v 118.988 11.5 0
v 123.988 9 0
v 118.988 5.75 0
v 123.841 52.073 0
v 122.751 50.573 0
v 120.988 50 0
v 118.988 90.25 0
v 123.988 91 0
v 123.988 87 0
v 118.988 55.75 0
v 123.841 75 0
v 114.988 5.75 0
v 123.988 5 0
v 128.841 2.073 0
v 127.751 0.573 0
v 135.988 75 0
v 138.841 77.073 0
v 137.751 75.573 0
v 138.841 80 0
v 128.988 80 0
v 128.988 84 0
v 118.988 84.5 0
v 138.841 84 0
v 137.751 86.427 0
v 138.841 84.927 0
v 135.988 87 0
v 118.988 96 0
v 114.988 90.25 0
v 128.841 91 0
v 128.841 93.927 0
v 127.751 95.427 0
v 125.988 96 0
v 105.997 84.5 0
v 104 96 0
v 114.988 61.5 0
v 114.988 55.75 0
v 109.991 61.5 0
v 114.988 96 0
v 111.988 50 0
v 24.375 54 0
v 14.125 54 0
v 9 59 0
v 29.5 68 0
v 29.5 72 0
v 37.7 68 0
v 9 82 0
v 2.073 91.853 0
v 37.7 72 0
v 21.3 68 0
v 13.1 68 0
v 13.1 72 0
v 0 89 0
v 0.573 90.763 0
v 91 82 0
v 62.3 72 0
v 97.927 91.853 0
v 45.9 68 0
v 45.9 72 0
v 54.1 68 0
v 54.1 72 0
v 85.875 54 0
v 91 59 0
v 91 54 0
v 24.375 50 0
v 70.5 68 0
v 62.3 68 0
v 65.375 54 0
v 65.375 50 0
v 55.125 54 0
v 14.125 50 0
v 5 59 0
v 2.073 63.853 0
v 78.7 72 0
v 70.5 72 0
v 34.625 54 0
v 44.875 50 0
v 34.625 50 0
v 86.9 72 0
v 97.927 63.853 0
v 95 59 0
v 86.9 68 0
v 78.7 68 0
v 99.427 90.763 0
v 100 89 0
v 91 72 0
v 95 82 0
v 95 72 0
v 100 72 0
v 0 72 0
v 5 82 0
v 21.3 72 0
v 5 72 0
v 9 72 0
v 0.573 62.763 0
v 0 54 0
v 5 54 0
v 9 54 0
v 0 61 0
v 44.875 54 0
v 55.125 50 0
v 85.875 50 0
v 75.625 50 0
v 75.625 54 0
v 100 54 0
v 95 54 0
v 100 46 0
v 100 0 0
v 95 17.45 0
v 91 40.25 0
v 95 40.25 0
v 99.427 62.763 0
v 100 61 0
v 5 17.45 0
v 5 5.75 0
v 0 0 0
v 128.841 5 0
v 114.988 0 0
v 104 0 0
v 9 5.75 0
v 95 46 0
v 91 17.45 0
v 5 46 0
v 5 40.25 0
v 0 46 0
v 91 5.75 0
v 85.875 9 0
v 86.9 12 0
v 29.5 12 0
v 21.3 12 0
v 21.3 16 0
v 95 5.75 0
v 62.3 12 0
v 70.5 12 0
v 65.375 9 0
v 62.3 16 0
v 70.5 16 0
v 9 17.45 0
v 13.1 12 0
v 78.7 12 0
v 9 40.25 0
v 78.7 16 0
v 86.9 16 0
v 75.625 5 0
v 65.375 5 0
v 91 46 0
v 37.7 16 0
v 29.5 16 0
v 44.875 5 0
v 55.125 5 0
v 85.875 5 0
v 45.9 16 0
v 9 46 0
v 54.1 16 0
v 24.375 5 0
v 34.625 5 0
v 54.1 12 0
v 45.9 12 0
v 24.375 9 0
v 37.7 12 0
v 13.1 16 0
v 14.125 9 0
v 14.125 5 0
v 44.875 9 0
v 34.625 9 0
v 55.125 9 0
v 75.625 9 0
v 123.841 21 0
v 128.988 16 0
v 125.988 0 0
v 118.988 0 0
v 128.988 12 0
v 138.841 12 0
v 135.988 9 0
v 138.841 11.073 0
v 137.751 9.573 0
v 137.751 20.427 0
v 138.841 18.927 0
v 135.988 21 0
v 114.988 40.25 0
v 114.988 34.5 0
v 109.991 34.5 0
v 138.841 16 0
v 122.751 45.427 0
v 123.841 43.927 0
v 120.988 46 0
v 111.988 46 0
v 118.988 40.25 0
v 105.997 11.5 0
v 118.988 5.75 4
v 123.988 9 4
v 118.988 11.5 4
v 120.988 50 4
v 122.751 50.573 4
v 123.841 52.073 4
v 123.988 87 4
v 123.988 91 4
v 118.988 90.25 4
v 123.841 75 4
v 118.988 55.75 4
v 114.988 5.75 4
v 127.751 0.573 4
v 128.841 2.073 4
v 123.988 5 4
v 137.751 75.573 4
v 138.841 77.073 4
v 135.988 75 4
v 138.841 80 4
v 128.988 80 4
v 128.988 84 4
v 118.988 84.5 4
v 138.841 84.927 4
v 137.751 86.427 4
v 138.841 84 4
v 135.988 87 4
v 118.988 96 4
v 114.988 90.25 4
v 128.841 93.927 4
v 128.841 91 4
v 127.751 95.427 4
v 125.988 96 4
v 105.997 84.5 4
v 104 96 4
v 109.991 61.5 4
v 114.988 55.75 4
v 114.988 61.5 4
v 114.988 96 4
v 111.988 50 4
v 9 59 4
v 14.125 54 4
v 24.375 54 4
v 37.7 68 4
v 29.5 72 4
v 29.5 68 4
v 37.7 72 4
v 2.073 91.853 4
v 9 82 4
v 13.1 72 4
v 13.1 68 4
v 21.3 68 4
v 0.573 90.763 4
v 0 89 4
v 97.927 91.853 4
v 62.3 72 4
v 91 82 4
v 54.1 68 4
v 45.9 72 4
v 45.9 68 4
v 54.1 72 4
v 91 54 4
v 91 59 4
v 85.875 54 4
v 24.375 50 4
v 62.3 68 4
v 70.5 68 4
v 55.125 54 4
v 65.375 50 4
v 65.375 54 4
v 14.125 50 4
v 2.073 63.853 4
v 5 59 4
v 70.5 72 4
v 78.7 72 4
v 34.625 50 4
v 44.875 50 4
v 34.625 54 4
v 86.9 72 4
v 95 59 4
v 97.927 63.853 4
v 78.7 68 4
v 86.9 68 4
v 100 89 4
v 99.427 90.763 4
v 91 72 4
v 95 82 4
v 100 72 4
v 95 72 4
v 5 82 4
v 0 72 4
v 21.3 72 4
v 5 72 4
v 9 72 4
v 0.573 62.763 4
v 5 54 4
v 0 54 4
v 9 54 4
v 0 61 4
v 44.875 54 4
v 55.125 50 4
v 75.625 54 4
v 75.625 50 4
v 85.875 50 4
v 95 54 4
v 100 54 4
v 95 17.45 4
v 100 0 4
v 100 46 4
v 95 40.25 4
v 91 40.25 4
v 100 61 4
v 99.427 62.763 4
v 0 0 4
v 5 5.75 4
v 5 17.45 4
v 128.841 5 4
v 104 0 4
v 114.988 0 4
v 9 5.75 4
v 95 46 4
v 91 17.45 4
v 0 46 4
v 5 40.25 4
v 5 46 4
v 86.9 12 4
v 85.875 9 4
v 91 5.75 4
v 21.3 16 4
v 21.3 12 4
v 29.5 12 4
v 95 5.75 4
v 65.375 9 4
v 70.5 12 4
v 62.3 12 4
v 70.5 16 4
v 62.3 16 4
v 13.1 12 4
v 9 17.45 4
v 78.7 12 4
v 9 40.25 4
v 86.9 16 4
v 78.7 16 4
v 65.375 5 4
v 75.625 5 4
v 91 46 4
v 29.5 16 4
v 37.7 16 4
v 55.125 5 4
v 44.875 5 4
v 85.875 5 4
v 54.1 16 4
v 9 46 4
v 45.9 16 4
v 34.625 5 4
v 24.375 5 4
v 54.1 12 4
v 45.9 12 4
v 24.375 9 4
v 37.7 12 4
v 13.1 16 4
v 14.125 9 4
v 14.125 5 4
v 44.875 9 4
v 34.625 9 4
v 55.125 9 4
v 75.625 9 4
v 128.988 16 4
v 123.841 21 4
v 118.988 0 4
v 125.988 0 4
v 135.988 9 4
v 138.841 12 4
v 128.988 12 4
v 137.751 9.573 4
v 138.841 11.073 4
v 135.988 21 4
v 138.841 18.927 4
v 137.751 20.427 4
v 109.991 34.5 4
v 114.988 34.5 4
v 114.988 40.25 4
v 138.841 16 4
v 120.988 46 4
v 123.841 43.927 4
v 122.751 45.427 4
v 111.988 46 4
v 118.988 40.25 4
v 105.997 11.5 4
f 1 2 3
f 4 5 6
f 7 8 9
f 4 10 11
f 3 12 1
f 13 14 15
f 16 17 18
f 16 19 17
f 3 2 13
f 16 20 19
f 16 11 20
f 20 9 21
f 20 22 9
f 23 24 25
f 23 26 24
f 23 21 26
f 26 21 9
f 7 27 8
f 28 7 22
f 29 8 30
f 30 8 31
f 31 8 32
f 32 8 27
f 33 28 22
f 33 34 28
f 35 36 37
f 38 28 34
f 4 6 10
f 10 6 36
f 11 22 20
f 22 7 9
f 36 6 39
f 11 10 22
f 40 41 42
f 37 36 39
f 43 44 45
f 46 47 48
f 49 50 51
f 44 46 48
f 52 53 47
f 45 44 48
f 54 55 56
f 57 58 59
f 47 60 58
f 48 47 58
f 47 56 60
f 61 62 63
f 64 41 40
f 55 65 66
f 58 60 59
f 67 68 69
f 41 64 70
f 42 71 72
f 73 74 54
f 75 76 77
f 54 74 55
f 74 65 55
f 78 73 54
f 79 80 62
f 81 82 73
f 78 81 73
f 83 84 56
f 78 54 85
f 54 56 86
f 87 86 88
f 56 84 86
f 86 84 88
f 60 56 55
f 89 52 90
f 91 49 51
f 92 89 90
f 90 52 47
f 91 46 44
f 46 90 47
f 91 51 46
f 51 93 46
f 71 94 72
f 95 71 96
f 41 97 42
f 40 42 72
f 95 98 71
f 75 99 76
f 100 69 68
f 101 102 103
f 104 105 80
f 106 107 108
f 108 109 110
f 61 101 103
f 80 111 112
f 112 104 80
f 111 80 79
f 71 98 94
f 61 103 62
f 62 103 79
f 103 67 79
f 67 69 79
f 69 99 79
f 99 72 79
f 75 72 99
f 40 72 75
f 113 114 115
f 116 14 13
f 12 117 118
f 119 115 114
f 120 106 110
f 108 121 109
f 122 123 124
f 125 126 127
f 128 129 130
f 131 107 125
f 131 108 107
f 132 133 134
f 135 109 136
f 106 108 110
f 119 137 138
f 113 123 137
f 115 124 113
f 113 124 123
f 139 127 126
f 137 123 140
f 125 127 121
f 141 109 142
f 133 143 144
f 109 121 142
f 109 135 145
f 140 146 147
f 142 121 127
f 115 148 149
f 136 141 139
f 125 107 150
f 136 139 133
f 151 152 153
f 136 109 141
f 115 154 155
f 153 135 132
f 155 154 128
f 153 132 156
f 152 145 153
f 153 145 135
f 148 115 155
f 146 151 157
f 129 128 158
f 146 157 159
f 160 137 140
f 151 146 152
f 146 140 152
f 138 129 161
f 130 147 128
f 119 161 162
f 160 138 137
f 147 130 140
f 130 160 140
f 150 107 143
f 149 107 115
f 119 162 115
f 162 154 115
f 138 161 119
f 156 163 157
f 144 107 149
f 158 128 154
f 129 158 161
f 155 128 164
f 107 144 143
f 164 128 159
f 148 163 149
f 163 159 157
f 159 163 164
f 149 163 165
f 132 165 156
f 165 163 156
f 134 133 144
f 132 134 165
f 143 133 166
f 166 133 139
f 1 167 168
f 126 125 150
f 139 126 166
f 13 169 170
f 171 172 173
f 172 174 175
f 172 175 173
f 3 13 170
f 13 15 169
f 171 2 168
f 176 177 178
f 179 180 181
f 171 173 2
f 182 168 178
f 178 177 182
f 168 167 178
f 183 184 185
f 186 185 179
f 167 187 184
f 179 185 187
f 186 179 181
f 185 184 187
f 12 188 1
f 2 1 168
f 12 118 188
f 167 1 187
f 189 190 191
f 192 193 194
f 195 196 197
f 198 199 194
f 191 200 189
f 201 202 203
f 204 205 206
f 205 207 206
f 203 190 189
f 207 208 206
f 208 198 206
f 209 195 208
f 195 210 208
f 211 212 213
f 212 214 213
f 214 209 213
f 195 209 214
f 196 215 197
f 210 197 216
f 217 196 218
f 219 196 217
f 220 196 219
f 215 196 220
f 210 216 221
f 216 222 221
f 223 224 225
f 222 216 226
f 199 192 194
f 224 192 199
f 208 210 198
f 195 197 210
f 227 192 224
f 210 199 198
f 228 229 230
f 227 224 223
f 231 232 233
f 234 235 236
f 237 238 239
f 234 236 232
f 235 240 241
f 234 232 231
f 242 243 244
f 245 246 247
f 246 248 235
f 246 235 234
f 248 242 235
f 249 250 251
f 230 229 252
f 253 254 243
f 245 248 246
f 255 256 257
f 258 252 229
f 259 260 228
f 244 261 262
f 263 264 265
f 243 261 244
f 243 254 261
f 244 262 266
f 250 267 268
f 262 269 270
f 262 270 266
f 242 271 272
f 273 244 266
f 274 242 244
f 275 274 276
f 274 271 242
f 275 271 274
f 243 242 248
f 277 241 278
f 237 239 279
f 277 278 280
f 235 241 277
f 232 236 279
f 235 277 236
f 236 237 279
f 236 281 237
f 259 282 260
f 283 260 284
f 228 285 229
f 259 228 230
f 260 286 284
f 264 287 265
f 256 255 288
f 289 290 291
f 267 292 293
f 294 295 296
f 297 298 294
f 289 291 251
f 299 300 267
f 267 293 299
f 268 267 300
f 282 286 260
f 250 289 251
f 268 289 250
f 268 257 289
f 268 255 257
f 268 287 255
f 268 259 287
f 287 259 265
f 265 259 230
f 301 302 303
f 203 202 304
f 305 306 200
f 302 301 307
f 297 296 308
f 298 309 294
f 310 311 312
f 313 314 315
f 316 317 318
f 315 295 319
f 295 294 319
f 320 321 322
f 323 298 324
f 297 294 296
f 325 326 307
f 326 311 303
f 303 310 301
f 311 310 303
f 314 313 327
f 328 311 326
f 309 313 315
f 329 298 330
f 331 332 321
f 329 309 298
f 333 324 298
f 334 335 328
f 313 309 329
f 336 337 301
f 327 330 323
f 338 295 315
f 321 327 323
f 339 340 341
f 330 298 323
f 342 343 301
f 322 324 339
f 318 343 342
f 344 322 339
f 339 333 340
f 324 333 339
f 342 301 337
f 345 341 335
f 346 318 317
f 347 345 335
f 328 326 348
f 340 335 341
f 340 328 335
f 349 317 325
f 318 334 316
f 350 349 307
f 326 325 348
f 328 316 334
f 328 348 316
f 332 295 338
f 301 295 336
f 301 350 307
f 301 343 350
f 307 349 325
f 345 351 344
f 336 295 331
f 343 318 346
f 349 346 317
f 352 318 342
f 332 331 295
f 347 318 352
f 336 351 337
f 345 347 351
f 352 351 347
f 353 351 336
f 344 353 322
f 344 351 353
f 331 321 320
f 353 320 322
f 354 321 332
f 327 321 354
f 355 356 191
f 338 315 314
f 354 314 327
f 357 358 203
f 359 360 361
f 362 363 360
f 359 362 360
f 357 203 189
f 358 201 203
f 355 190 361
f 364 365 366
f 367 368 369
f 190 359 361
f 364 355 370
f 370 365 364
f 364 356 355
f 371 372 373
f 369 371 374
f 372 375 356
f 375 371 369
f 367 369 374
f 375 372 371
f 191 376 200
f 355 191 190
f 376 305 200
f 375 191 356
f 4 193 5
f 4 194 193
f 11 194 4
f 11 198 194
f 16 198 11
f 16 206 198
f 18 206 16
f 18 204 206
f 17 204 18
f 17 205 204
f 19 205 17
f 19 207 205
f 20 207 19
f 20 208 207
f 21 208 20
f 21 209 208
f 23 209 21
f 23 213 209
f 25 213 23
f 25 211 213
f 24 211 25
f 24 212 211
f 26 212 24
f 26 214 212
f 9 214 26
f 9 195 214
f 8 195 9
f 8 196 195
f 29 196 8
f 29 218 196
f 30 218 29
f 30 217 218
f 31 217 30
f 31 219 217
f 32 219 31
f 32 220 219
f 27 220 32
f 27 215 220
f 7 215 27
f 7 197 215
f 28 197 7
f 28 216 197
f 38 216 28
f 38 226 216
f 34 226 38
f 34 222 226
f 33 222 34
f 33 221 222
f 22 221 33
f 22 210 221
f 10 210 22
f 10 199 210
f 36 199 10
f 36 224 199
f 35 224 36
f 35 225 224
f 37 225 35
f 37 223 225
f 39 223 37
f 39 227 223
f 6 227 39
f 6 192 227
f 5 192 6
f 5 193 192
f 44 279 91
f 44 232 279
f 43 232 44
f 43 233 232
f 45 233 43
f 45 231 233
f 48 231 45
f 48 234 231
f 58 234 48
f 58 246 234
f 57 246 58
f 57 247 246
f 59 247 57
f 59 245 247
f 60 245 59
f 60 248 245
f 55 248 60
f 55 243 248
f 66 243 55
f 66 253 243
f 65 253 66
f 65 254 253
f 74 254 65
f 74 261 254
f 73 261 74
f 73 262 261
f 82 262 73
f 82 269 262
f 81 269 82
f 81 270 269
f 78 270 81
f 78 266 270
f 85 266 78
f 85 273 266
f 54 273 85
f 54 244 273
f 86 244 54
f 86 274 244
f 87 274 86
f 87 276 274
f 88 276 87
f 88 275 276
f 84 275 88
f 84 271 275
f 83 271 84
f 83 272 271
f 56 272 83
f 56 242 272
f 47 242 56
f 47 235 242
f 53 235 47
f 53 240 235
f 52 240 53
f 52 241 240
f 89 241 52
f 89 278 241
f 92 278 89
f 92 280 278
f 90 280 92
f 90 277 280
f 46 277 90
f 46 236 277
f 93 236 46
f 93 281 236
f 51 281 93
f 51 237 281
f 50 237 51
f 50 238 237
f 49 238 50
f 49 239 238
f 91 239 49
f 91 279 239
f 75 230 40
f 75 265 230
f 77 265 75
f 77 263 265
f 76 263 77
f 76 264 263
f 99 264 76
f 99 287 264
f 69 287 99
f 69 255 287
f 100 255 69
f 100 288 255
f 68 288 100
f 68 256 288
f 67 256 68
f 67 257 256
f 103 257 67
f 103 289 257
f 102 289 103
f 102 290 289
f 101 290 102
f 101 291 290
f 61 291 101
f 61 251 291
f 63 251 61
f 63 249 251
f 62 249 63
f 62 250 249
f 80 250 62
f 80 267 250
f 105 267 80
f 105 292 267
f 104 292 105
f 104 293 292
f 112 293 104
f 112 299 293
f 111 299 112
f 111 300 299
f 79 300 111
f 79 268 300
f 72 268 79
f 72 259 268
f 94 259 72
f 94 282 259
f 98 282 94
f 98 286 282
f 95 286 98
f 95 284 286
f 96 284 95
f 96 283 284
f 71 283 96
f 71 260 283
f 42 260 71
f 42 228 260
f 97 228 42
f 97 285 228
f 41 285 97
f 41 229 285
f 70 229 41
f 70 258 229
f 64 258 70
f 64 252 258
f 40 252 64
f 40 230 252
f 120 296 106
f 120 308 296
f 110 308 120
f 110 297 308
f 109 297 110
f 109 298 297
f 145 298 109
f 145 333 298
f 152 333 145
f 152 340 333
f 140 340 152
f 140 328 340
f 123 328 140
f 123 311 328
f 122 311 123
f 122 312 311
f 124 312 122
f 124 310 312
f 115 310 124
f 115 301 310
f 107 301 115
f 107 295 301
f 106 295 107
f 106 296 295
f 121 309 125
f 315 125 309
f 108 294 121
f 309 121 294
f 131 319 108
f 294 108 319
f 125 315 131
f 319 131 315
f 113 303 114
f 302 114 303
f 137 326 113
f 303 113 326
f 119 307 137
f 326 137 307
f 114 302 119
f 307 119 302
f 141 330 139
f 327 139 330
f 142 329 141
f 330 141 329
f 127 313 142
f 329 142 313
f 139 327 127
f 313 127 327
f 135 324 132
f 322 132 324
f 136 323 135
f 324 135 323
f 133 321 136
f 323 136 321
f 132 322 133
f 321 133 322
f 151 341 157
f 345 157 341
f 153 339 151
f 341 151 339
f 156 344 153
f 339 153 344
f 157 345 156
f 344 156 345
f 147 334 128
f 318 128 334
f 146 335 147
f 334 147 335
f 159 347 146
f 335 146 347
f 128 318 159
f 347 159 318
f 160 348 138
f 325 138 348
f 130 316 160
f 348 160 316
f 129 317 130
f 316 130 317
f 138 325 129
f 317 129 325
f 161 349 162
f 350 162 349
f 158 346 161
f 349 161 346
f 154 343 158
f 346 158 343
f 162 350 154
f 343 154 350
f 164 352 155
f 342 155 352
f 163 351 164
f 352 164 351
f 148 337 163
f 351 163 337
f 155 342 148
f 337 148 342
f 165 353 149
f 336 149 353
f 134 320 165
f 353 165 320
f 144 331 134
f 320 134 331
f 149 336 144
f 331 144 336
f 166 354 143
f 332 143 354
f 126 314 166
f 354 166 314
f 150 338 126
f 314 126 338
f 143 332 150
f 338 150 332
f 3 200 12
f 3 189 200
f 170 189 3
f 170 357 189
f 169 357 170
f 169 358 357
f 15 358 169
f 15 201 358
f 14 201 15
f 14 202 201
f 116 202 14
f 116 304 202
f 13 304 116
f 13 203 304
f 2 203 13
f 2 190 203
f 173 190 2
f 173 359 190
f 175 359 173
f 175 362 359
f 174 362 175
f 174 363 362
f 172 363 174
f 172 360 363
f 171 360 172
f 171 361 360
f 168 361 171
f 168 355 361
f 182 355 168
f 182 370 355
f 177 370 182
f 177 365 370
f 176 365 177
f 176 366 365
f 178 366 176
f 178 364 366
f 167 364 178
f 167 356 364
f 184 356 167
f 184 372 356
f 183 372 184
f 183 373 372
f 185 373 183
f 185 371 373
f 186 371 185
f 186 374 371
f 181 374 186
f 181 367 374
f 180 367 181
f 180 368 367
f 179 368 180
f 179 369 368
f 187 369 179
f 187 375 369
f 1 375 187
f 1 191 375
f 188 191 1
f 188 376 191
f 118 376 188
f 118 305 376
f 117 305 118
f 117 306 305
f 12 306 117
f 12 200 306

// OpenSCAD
// ajuste de qualidade
//$fa=1; // minimo angulo
//$fs=0.01; // minimo segmento
//$fn=36;

//relativo ao material
// espessura do material
thick=4; 

// borda necessária para montagem
reserva=5;

// largura total
width=100;
 
// extensão para estabilidade
extra=30; 

// altura do primeiro apoio
height_1=20;

// altura do segundo apoio
height_2=10; 

// encaixes do primeiro apoio
qt_slot_1=5; 


// encaixes do segundo apoio
qt_slot_2=4;

// espaço entre paredes
between=3; 

// proportion taken by each slot relative to total depth
base_slot = 1/4; 

// altura extra para evitar fragilidade da base
neck = 3; 

//angulo das cartas
theta = 10; 

//calculo intermediario
radius=min(between,reserva); // raio da borda arredondada
fit=0.1+abs(height_1-height_2); // para evitar problemas no difference

ext_norm=max(extra,reserva);
h_base=ext_norm+thick+between+thick+reserva;
h_p2=height_2+thick;
h_p1=height_1+thick;
hb = h_base*sin(theta);
slot_w = base_slot*h_base;
slot_h = 0.1+hb+neck+thick;	

linear_extrude(height = thick){
//base
difference(){
	square([width,h_base]);
	
	translate([0,reserva,0])
		encaixes(largura=width, altura=thick, qt=qt_slot_2, borda=reserva+thick);
	translate([0,reserva+between+thick,0])
		encaixes(largura=width, altura=thick, qt=qt_slot_1, borda=reserva+thick);
//desenhar os encaixes da lateral
	translate([reserva,slot_w/2,0])
		square([thick,slot_w+0.2/**/]);
	translate([width-thick-reserva,slot_w/2,0])
		square([thick,slot_w+0.2/**/]);
	translate([reserva,h_base-slot_w/2,0])
		square([thick,slot_w/2+0.2/**/]);
	translate([width-thick-reserva,h_base-slot_w/2,0])
		square([thick,slot_w/2+0.2/**/]);

}

// segundo apoio
translate([0,h_base+thick,0])
	parede (height_2,qt_slot_2);


// primeiro apoio
translate([0,h_base+thick+h_p2+thick,0])
	parede (height_1,qt_slot_1);

// laterais
rotate (-90) translate([-h_base,width+thick,0])
	lateral();
rotate (-90) translate([-(h_base+thick),width+thick,0]) mirror([1,0,0]) 
	lateral();
}
///////////////////////////////////////////////////////////////////
module lateral () {
	
//	polygon(points = [[h_base,0],[0,h_base*sin(theta)],[h_base,h_base*sin(theta)]]);
	difference() {
		union(){
			polygon(points = [[h_base,0],[0,h_base*sin(theta)],[h_base,h_base*sin(theta)]]);
			translate([0,hb,0]) 
				apoio(largura=h_base/*ext_norm+reserva+thick+between+thick/**/, altura=neck+thick+reserva, raio=radius);
			// lateral
			translate([ext_norm-reserva,neck+thick+hb,0])
				apoio(largura=reserva+thick+between, altura=height_1, raio=between);
			translate([ext_norm+thick,neck+thick+hb,0])
				apoio(largura=between+thick+reserva, altura=height_2, raio=between);
		};
	// aplicar encaixes na junção da peça
		translate([ext_norm-reserva,neck+thick+hb,0])
			fenda (xx=reserva, altura=height_1, parede=thick, baixo=false);
		translate([ext_norm+thick,neck+thick+hb,0])
			fenda (xx=between, altura=height_2, parede=thick, baixo=false);
		translate([slot_w,-(0.1),0])
			square([h_base-2*slot_w,slot_h]);
		translate([slot_w/2,hb+neck,0])
			square([slot_w/2+0.1,thick]);
		translate([h_base-slot_w/2,hb+neck,0])
			square([slot_w/2+0.1,thick]);
	}
}

module parede(hh,nn) {
	union(){
		encaixes(largura=width, altura=thick, qt=nn, borda=reserva+thick);
		translate([0,thick,0])
			difference() {
				apoio(largura=width, altura=hh, raio=radius);
				fendas_apoio(largura=width,altura=hh, parede=thick, borda=reserva);
			}
	}
}

module fendas_apoio(largura, altura, parede, borda=0, baixo=true) {

	fenda (xx=borda, altura=altura, parede=parede, baixo=baixo);
	fenda (xx=largura-borda-parede, altura=altura, parede=parede, baixo=baixo);
	
}

///////////////////////////////////////////////////////////////////
module apoio(largura, altura, raio=1) {
	hull(){
		square(size=[largura,0.01],center=false);
	//cortar os circulos?
		translate([raio,altura-raio,0])circle(r=raio);
		translate([largura-raio,altura-raio,0])circle(r=raio);
	}
}

module encaixes (largura, altura, qt=1, proporcao=0.5, borda=0) {
	total=largura-2*borda;
	passo=total/qt;
	for (i=[0:passo:total]){
		if (i < total) {
			translate([borda+i+passo/2,altura/2,0])square(size=[passo*proporcao,altura],center=true);
		}
	}
} 

module fenda(xx, altura, parede, baixo=true) {
	
	yy=baixo?-fit:altura/2;

	translate([xx,yy,0]) square(size=[parede,altura/2+fit],center=false);

}
